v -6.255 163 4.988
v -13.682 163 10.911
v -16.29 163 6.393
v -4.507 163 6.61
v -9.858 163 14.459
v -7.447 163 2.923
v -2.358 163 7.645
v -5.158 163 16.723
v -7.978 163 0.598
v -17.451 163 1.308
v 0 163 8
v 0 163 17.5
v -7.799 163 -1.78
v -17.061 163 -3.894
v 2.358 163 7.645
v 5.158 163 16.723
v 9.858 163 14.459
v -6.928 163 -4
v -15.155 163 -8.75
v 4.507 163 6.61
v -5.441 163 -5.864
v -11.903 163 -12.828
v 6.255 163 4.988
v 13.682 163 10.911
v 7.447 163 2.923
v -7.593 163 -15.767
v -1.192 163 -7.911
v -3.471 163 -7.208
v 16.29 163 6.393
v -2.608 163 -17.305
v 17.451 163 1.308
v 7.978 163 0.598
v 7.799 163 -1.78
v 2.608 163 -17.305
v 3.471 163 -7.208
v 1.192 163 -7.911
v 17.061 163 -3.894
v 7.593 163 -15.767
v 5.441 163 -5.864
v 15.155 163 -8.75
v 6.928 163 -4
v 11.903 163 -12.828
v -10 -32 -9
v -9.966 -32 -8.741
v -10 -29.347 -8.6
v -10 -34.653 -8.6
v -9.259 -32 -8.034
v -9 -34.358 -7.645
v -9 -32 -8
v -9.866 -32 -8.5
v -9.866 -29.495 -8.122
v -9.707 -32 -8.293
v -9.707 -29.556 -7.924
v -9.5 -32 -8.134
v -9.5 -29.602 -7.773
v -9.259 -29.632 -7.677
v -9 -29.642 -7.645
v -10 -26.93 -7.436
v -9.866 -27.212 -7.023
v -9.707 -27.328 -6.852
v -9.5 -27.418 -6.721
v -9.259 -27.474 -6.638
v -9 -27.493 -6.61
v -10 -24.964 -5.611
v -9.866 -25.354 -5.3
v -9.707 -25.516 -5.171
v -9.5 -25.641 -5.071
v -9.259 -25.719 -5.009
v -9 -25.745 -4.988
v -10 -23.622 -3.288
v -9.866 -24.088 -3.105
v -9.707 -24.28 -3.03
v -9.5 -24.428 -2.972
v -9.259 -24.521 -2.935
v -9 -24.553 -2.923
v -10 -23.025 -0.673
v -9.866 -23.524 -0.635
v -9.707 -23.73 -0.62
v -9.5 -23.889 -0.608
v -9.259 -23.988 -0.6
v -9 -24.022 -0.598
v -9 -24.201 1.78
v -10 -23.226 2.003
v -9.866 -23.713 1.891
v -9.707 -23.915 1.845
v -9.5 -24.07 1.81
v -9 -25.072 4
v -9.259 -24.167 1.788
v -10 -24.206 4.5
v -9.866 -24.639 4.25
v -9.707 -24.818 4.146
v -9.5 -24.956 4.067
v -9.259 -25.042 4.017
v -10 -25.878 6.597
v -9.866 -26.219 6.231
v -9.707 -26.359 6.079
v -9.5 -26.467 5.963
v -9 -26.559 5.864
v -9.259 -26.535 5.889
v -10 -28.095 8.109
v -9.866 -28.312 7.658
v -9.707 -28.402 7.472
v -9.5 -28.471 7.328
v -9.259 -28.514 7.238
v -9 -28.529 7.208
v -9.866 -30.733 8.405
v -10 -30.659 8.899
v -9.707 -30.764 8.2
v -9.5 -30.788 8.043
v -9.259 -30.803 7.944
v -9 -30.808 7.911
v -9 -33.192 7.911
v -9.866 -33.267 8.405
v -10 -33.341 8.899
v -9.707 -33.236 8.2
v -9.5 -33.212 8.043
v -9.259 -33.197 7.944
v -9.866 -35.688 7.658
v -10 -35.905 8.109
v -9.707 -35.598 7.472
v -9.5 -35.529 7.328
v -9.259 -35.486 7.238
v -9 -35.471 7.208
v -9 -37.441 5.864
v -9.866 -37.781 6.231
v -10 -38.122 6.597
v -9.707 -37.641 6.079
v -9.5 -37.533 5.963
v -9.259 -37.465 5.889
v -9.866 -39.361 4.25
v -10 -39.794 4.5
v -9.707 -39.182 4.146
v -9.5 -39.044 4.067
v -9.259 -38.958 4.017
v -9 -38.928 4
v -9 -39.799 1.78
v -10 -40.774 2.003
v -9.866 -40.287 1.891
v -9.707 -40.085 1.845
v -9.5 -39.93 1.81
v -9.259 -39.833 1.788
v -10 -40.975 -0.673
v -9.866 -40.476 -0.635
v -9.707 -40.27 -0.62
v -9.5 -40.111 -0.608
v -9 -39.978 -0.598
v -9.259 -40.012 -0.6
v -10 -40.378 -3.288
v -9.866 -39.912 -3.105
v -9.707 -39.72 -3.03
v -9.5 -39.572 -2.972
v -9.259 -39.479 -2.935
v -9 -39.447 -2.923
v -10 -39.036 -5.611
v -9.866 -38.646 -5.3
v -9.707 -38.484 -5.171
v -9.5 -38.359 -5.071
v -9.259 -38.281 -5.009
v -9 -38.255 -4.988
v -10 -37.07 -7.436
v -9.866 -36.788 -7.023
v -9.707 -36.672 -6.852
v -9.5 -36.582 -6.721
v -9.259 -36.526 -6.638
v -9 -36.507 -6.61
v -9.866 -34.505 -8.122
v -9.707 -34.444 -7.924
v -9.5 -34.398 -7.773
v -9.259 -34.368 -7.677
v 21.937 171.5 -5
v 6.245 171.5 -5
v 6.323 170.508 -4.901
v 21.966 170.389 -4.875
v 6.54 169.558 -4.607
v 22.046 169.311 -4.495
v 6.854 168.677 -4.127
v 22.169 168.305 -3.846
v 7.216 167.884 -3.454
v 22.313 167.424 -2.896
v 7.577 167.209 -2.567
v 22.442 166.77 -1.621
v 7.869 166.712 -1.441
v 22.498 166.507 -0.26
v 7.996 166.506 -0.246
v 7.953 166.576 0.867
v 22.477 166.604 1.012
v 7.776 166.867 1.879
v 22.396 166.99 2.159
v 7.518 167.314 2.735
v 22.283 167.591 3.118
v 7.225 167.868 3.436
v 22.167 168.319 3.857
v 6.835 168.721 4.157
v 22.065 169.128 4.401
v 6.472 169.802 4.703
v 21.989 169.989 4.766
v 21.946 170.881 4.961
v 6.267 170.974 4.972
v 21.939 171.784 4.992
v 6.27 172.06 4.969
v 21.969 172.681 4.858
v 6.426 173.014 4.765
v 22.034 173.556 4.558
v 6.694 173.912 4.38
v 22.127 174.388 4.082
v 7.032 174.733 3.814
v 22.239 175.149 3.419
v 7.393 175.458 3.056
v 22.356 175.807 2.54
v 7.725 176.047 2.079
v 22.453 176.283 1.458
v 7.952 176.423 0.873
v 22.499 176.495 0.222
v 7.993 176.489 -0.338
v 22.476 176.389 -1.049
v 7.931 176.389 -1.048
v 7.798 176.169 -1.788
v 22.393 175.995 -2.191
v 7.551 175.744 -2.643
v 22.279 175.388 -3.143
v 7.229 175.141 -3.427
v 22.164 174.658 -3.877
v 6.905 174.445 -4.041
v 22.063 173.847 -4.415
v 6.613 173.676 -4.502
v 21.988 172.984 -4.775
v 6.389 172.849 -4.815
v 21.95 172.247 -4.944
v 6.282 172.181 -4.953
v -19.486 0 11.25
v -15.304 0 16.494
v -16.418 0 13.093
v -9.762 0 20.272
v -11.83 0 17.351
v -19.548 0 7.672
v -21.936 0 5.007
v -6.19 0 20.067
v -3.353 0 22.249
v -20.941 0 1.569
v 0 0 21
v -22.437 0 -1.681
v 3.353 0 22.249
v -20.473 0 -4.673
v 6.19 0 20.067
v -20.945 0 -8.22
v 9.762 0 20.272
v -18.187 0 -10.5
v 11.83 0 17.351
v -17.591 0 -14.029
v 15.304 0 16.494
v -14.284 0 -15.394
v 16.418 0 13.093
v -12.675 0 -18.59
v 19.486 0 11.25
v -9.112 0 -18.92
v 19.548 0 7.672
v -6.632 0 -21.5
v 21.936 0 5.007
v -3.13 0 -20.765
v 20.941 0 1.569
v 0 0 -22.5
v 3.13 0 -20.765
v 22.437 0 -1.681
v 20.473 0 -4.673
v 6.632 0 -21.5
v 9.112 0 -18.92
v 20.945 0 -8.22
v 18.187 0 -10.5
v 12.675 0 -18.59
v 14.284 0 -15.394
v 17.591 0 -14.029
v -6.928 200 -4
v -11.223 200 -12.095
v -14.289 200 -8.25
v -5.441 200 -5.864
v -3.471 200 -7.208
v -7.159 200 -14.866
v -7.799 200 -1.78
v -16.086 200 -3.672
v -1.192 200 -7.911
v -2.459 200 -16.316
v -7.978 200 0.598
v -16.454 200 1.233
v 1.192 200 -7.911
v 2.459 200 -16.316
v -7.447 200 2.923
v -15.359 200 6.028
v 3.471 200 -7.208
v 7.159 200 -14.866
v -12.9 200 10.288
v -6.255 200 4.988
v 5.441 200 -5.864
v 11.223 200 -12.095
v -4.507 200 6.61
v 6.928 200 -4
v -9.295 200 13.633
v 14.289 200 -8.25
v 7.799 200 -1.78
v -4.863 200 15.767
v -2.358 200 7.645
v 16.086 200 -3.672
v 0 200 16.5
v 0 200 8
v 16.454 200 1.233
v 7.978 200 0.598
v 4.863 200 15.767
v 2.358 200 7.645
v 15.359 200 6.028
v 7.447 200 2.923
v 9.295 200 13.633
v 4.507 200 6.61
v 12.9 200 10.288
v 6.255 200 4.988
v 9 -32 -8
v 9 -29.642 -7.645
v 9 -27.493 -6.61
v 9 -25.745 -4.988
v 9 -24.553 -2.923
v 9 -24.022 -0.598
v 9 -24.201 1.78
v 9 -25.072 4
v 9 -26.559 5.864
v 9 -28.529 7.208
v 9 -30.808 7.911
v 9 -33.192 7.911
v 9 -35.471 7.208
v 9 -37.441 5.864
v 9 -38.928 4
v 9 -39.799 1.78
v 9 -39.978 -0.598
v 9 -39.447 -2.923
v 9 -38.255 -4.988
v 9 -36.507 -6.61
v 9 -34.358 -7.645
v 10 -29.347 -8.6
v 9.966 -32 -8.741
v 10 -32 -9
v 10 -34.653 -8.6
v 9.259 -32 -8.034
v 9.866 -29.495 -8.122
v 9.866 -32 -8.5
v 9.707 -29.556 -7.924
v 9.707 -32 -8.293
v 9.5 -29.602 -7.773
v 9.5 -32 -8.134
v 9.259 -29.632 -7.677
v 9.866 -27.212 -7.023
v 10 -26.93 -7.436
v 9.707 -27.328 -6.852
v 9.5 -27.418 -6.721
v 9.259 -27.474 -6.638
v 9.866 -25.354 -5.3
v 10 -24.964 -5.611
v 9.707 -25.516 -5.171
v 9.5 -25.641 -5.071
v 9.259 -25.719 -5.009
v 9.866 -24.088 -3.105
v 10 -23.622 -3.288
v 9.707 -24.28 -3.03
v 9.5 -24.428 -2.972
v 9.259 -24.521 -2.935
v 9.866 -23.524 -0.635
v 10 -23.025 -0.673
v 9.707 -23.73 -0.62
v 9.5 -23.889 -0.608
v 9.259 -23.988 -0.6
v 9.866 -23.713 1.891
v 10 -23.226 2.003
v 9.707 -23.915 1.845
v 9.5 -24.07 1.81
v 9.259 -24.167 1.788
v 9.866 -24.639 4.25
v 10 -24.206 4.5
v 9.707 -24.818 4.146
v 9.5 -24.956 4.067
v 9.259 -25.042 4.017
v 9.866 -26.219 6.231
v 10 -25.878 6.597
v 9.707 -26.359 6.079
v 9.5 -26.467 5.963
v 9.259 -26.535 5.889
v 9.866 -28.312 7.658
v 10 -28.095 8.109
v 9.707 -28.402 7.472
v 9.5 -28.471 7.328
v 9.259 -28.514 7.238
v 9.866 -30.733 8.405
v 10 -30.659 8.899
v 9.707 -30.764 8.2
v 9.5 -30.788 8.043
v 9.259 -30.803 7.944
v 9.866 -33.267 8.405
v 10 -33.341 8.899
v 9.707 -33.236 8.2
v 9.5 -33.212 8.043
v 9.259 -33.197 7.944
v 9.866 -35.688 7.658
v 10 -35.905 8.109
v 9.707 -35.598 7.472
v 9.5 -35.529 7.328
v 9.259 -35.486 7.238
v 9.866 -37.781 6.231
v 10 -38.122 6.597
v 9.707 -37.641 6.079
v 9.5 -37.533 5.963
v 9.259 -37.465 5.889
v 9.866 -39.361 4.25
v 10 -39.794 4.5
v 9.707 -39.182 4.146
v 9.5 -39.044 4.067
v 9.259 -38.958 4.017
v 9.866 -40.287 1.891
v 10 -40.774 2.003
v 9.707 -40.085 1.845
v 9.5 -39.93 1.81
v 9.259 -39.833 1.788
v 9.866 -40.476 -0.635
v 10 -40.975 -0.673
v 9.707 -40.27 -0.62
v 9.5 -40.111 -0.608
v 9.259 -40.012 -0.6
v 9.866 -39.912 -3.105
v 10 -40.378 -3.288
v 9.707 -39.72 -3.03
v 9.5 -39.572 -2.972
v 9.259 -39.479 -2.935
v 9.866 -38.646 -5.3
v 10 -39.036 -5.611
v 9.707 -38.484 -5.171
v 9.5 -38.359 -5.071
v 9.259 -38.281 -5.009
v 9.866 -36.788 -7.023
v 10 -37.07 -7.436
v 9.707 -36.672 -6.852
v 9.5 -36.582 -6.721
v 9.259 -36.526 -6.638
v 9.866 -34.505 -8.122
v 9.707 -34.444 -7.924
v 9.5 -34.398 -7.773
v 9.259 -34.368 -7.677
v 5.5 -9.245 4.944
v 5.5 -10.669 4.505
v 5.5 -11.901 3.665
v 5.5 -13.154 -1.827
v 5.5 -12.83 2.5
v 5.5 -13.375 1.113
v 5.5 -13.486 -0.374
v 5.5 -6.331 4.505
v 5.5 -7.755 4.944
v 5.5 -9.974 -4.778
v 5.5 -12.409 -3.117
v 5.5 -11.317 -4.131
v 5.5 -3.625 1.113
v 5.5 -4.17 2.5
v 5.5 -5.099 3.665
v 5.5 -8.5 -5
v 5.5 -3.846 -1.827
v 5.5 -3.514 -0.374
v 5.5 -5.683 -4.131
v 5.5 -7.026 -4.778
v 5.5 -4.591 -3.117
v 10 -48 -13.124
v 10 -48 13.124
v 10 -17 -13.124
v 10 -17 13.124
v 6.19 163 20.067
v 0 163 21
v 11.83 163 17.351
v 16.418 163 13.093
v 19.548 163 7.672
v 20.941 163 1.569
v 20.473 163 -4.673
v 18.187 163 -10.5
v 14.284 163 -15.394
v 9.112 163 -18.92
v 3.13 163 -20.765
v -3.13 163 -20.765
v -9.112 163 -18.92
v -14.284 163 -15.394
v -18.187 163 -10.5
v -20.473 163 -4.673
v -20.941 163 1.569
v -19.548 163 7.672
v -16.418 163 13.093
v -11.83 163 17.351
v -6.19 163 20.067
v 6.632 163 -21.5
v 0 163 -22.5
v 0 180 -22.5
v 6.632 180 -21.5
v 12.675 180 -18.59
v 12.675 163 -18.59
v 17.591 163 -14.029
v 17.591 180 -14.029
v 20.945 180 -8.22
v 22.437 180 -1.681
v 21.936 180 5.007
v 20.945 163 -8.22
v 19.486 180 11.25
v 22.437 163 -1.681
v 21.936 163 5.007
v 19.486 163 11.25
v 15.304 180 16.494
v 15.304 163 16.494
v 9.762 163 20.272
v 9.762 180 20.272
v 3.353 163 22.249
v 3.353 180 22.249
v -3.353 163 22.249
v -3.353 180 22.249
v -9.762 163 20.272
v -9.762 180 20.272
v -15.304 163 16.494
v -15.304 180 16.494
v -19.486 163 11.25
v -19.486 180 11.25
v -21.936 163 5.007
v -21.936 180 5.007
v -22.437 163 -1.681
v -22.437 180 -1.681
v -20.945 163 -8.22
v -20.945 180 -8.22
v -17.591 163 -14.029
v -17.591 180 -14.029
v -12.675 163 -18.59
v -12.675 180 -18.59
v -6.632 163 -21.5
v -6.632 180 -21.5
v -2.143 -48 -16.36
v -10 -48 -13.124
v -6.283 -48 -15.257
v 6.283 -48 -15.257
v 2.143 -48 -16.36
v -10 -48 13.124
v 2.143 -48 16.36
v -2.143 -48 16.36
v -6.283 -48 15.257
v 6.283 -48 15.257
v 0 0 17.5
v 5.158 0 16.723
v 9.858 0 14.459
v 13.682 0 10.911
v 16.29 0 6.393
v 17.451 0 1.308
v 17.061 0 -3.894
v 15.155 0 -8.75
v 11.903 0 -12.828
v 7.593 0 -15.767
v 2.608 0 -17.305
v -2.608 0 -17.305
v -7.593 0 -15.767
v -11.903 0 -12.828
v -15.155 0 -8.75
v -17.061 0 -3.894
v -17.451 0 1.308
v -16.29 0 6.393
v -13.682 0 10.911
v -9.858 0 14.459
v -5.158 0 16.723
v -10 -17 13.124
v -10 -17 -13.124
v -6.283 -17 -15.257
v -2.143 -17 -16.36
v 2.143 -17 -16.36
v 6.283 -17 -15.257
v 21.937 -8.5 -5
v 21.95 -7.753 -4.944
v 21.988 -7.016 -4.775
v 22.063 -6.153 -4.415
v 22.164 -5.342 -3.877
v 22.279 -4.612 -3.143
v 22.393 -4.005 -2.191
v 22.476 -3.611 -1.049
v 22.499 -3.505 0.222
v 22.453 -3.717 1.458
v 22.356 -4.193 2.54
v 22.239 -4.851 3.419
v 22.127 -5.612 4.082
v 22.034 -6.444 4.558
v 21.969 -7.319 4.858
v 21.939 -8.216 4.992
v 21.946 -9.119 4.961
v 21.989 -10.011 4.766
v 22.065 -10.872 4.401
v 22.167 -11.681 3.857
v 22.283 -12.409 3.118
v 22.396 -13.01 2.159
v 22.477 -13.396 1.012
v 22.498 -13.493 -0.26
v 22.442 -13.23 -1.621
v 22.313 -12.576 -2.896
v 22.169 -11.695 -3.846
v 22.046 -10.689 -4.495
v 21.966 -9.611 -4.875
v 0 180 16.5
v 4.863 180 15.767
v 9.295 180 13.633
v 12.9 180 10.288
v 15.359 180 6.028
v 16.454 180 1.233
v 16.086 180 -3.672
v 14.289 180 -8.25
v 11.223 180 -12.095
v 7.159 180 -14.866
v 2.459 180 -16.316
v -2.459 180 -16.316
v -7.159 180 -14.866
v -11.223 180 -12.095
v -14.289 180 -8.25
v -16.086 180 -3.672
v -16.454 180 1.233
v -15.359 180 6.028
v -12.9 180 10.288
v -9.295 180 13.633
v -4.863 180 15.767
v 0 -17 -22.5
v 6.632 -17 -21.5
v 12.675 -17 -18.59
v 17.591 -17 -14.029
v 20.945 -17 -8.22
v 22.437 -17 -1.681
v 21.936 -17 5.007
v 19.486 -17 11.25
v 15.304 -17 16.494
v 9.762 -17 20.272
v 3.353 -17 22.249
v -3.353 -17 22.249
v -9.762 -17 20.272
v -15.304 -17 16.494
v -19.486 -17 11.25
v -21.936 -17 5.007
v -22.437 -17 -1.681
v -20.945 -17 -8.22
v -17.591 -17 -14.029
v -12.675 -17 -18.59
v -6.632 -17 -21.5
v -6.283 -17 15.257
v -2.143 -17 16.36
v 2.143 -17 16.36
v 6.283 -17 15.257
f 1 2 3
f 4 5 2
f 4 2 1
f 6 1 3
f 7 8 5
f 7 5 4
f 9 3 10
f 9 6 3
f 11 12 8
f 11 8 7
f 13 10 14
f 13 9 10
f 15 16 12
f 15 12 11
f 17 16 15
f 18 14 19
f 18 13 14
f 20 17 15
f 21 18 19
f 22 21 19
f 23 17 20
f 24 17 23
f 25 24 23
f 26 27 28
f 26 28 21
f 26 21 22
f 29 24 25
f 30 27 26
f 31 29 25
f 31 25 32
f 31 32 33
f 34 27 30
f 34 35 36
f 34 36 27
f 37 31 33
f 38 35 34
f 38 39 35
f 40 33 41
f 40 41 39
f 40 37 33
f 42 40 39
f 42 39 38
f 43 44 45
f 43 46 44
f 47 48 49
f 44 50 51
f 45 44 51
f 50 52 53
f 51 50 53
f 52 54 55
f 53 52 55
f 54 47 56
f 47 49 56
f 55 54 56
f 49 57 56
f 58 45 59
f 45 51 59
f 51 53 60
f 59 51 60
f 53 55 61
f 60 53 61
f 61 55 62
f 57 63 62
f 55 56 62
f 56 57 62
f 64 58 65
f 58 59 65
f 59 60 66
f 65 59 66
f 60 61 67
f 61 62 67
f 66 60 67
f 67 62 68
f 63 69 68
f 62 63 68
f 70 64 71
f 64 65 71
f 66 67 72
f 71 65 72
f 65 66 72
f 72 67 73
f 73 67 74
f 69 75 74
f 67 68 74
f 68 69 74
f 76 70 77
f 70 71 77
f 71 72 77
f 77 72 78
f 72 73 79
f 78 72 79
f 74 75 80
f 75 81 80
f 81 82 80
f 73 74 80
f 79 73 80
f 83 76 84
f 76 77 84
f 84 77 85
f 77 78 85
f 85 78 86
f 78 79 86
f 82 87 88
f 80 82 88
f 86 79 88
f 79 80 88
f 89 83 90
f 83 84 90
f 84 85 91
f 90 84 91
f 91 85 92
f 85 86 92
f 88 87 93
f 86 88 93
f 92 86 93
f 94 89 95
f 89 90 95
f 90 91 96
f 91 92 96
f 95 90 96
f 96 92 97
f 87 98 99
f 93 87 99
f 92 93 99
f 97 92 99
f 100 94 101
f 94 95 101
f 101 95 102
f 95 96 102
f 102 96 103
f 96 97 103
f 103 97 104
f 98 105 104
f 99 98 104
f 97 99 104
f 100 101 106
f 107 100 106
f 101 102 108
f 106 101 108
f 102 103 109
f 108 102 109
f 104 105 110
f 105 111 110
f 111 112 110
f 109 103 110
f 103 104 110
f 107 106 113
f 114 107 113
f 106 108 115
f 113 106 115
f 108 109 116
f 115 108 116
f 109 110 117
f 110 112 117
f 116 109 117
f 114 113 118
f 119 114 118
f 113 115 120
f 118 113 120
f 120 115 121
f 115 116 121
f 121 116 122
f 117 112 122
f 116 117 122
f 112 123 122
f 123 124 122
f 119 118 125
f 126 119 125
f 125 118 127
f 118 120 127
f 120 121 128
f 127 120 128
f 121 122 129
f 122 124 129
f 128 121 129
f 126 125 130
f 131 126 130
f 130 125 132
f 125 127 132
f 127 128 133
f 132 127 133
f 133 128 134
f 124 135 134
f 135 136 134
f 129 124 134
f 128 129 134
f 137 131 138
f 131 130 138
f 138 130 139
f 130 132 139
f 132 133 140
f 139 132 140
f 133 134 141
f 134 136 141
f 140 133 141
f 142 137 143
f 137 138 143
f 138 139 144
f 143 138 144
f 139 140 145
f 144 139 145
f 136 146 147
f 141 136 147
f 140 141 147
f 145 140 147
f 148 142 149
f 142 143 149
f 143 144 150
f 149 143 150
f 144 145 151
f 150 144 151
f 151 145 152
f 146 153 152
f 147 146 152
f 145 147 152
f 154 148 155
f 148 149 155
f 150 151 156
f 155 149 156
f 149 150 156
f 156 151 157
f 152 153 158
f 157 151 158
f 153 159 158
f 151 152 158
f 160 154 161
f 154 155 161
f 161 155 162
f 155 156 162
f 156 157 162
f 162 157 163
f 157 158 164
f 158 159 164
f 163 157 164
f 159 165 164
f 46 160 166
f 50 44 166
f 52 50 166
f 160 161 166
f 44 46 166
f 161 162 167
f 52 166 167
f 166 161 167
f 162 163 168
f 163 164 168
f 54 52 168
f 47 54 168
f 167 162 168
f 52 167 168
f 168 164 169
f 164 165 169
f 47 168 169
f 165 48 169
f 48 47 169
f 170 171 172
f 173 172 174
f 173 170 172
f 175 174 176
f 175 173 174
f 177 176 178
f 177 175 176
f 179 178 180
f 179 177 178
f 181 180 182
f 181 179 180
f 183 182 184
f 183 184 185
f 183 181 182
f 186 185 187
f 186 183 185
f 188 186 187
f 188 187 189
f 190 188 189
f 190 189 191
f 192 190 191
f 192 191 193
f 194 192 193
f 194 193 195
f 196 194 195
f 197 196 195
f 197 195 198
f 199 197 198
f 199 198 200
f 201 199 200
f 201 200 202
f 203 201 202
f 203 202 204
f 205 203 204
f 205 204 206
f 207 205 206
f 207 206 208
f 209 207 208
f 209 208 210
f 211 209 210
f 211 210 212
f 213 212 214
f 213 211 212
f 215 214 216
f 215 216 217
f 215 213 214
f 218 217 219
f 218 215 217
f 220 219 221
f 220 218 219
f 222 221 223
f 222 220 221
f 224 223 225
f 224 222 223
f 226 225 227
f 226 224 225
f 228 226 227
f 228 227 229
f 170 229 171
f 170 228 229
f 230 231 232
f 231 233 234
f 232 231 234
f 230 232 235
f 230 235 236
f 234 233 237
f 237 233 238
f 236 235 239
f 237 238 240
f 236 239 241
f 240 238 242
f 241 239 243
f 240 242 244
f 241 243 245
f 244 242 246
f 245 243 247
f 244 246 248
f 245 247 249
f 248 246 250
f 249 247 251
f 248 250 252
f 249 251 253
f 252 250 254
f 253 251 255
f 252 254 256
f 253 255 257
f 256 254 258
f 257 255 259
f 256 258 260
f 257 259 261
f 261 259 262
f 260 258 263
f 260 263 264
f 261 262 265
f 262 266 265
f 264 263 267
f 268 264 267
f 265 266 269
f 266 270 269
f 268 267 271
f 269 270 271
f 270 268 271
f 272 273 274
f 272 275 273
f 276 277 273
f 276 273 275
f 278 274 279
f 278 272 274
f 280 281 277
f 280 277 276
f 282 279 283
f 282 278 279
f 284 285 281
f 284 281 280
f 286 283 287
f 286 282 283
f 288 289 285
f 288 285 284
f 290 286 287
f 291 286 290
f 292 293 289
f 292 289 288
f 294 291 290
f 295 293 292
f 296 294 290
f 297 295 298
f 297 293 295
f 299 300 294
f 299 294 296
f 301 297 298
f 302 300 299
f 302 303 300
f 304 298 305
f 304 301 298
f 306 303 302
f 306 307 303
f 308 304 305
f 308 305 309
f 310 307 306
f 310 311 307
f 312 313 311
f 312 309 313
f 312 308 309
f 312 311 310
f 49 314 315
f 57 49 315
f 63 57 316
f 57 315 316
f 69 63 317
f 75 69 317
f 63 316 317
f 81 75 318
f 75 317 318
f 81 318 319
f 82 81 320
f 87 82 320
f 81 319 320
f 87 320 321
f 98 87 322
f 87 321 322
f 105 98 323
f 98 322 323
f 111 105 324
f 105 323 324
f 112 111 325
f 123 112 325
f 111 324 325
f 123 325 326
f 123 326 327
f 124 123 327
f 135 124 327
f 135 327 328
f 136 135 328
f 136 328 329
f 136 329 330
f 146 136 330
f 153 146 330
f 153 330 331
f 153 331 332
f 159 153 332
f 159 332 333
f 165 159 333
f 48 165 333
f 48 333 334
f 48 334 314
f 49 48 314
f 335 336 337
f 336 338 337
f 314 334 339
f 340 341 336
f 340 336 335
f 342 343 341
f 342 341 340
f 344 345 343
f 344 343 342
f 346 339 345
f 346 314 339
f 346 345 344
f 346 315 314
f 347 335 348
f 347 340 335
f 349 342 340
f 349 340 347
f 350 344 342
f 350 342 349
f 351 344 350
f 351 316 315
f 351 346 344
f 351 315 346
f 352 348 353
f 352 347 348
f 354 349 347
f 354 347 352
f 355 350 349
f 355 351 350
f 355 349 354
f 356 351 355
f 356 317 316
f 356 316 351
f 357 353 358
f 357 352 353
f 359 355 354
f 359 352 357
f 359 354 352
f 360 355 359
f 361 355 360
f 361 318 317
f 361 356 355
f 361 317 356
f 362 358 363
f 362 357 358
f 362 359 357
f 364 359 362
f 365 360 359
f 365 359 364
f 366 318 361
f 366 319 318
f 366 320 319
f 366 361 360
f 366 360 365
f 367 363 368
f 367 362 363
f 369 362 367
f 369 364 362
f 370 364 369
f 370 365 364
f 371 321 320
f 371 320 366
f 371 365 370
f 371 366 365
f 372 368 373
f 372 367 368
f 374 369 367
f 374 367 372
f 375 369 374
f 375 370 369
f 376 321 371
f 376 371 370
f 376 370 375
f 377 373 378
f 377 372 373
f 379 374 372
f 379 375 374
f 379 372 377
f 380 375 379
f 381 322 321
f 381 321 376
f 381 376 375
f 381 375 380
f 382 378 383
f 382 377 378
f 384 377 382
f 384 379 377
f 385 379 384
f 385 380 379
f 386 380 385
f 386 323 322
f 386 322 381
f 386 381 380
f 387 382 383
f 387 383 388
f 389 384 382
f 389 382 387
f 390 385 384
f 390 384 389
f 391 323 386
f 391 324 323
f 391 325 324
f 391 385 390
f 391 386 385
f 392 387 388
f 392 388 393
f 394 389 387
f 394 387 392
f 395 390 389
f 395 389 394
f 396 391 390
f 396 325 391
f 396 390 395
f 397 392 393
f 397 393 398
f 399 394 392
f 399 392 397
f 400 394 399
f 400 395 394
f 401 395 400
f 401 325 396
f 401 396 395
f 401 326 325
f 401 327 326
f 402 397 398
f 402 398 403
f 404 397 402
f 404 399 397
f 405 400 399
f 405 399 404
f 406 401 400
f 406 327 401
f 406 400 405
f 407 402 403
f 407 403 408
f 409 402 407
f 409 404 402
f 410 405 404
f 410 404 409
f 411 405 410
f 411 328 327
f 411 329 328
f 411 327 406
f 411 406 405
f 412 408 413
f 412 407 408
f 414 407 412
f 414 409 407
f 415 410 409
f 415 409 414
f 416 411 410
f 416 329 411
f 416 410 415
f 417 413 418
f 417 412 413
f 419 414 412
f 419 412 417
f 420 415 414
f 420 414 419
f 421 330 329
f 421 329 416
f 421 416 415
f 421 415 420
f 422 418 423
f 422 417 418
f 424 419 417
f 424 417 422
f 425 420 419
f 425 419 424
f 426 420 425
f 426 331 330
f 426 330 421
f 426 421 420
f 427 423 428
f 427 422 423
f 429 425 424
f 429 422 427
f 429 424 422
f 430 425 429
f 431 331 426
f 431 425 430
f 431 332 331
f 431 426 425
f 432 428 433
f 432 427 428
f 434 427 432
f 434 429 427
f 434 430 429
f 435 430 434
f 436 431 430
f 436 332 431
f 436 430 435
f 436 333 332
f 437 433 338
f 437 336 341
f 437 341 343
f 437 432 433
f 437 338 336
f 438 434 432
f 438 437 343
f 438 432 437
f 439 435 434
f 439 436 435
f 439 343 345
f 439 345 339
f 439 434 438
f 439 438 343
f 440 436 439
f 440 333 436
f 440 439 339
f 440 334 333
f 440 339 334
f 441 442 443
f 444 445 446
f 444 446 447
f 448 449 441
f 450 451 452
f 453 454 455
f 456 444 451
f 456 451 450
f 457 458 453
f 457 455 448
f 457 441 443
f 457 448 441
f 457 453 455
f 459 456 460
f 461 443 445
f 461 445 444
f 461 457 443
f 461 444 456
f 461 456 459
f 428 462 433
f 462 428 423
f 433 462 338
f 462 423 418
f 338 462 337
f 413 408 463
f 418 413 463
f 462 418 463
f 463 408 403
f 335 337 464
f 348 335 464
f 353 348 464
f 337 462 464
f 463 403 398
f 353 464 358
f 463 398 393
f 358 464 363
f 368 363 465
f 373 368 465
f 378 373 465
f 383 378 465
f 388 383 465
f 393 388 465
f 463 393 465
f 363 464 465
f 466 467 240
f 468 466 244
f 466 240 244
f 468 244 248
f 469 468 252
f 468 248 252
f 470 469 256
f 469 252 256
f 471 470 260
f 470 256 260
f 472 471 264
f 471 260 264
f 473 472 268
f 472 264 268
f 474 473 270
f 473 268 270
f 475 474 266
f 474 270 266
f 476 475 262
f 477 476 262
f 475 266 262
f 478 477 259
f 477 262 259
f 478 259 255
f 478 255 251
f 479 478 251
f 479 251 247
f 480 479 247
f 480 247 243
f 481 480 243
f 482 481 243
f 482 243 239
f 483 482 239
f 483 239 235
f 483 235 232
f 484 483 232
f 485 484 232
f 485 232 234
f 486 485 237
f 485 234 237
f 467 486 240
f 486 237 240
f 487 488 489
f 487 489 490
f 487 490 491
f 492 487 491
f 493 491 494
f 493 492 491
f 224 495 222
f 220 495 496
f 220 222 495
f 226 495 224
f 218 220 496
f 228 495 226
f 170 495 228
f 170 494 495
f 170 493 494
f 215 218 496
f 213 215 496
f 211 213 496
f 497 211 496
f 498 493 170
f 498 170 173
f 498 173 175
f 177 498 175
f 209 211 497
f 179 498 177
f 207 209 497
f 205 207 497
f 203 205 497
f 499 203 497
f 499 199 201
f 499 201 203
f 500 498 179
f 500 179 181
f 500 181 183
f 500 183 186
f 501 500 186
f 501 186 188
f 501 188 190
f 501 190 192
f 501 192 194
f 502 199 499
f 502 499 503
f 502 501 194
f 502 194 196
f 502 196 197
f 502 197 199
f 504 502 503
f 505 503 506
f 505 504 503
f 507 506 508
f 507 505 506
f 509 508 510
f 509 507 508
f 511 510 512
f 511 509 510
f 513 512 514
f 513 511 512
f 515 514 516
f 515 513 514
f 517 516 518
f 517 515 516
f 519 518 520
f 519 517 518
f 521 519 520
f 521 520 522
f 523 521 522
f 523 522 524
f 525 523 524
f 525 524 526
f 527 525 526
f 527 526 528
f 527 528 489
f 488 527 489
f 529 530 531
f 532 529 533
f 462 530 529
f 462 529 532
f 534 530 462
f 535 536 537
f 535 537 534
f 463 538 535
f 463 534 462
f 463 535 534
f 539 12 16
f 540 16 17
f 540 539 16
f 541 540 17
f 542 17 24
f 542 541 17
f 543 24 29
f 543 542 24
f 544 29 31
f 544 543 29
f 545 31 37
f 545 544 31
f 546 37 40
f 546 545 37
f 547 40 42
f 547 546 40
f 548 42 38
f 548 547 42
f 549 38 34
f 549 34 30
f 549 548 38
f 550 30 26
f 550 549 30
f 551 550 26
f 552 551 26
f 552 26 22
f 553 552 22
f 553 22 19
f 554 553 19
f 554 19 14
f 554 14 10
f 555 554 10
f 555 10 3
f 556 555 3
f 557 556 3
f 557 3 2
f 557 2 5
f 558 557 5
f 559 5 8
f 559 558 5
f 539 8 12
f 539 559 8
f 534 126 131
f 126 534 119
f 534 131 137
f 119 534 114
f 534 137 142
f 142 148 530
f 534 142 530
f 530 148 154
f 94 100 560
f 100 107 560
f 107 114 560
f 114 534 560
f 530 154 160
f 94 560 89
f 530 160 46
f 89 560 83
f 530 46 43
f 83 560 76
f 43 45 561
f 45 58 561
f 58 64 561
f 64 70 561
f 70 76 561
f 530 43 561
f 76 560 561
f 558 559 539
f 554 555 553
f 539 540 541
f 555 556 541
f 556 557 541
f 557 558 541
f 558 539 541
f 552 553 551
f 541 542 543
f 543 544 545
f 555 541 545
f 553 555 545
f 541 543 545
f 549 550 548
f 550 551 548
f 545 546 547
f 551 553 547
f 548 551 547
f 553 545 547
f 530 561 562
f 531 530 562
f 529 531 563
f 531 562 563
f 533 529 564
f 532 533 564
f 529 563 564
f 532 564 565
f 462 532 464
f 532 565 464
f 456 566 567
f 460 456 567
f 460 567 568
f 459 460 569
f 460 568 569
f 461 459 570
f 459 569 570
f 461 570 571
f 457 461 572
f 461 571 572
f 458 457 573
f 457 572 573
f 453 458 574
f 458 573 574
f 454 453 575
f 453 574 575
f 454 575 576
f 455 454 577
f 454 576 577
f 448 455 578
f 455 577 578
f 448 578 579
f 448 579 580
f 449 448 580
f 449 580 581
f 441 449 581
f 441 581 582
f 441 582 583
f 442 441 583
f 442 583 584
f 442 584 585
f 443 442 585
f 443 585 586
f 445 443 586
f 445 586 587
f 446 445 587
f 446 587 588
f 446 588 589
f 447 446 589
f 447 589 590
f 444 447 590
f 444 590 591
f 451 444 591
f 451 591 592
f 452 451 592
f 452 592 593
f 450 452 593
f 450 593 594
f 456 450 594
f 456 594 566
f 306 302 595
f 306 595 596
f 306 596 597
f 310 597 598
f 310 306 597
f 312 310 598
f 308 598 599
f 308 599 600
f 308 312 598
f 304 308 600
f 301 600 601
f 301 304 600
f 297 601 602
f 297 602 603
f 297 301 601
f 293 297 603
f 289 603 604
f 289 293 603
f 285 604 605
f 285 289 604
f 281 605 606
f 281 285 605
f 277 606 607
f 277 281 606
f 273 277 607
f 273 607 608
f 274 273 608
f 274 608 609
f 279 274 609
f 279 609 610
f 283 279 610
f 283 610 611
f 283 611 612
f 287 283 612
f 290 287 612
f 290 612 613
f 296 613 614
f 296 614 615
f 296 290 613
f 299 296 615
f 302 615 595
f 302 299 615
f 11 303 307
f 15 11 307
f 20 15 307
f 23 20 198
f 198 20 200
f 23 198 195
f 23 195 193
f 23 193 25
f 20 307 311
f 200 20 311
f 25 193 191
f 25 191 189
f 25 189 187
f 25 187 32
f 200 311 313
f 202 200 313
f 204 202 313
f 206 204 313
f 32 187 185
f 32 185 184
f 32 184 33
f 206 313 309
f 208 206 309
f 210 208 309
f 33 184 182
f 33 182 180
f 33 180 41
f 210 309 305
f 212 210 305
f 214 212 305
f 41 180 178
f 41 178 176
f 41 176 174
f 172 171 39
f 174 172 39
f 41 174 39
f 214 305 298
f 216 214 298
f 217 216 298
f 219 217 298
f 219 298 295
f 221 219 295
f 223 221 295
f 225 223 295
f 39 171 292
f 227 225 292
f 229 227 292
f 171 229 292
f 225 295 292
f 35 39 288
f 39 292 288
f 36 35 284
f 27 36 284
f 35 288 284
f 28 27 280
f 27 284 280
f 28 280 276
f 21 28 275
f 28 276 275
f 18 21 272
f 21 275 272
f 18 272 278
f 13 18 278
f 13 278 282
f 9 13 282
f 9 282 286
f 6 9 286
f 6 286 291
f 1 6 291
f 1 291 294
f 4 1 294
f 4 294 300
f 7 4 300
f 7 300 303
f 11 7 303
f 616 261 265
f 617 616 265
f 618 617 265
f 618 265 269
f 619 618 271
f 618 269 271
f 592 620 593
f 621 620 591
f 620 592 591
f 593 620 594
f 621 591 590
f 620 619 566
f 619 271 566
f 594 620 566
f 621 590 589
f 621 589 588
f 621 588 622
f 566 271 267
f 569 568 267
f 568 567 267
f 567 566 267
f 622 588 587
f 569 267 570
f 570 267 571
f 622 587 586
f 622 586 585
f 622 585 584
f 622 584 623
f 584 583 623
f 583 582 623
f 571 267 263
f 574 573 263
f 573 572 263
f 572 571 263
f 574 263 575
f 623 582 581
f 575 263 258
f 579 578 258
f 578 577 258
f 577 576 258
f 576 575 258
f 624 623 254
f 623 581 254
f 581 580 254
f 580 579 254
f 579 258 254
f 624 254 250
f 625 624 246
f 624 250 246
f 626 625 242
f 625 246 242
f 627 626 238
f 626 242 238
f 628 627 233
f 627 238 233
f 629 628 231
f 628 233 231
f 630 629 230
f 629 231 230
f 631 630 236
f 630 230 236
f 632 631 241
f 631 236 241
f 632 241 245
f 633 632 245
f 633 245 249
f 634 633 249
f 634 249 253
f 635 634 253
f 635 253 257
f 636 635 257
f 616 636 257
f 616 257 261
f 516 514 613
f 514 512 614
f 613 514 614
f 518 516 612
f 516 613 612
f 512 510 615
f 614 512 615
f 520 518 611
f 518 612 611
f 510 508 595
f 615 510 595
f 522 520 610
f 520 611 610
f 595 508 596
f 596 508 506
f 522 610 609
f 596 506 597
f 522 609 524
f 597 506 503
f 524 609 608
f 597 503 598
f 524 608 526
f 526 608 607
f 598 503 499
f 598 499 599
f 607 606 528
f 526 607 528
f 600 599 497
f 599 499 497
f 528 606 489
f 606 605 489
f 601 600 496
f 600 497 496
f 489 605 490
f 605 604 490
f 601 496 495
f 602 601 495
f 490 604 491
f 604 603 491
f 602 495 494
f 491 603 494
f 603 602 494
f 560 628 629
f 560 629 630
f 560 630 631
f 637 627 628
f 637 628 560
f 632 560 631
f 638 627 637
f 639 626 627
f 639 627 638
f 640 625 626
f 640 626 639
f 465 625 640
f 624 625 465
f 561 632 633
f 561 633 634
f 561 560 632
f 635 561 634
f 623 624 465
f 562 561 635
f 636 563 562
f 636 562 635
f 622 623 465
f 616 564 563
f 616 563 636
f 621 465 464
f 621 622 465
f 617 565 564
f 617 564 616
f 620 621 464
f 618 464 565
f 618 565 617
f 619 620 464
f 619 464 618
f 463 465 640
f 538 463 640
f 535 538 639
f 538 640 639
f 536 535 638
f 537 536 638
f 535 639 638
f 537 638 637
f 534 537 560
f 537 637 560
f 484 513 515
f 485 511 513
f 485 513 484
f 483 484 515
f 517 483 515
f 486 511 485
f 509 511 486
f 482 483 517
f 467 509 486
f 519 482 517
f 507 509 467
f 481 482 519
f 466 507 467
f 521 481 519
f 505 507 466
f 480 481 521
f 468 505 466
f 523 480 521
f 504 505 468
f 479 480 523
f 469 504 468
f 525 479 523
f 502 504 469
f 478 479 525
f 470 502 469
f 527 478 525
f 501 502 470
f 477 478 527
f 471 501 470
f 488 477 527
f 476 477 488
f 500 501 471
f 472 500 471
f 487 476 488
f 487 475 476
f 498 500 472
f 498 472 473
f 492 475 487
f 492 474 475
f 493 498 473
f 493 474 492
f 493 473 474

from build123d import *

# Parameters (mm, degrees)
SKETCH_1_R          = 21
SKETCH_1_R_2        = 17.5
EXTRUDE_1_DEPTH     = 163
SKETCH_2_R          = 22.5
EXTRUDE_2_DEPTH     = 17
SKETCH_4_R          = 5
CUT_EXTRUDE_3_DEPTH = 17
EXTRUDE_4_DEPTH     = 31
SKETCH_6_R          = 8
CUT_EXTRUDE_5_DEPTH = 31
FILLET_1_R          = 1
EXTRUDE_START       = 20
SKETCH_7_R          = 16.5
EXTRUDE_6_DEPTH     = 20
CUT_EXTRUDE_9_REACH = 252.033
SKETCH_8_R          = 8


with BuildPart() as part:
    # 草图1 → 拉伸1 (new body)
    with BuildSketch(Plane(origin=(0, 0, 0), x_dir=(1, 0, 0), z_dir=(0, 1, 0))):
        with Locations(Location((0, 0, 0), (0, 0, 270))):
            Circle(SKETCH_1_R)
        with Locations(Location((0, 0, 0), (0, 0, 270))):
            Circle(SKETCH_1_R_2, mode=Mode.SUBTRACT)
    extrude(amount=EXTRUDE_1_DEPTH)

    # 草图2 → 拉伸2 (add)
    with BuildSketch(Plane.XZ):
        with Locations(Location((0, 0, 0), (0, 0, 270))):
            Circle(SKETCH_2_R)
    extrude_2 = extrude(amount=EXTRUDE_2_DEPTH)

    # 草图4 → 拉伸3 (cut)
    with BuildSketch(Plane(origin=(22.5, 0, 0), x_dir=(0, 0, -1), z_dir=(1, 0, 0))):
        with Locations((0, -8.5)):
            Circle(SKETCH_4_R)
    cut_extrude_3 = extrude(amount=-CUT_EXTRUDE_3_DEPTH, mode=Mode.SUBTRACT)

    # 镜向1: 拉伸2, 拉伸3 across plane
    add(extrude_2.mirror(Plane.ZX.offset(81.5)))
    add(cut_extrude_3.mirror(Plane.ZX.offset(81.5)), mode=Mode.SUBTRACT)

    # 草图5 → 拉伸4 (add)
    with BuildSketch(Plane.XZ.offset(17)):
        with BuildLine():
            Line((10, -13.124404748), (10, 13.124404748))
            ThreePointArc((10, 13.124404748), (0, 16.5), (-10, 13.124404748))
            Line((-10, 13.124404748), (-10, -13.124404748))
            ThreePointArc((-10, -13.124404748), (0, -16.5), (10, -13.124404748))
        make_face()
    extrude(amount=EXTRUDE_4_DEPTH)

    # 草图6 → 拉伸5 (cut)
    with BuildSketch(Plane(origin=(10, 0, 0), x_dir=(0, 0, -1), z_dir=(1, 0, 0))):
        with Locations((0, -32)):
            Circle(SKETCH_6_R)
    extrude(amount=-CUT_EXTRUDE_5_DEPTH, mode=Mode.SUBTRACT)

    # 圆角1
    fillet_1_edges = [part.edges().sort_by_distance(p)[0] for p in [
        (-10, -32, 8),
        (10, -32, 8),
    ]]
    fillet(fillet_1_edges, radius=FILLET_1_R)

    # 草图7 → 拉伸6 (add)
    with BuildSketch(Plane(origin=(0, 180, 0), x_dir=(1, 0, 0), z_dir=(0, 1, 0)).offset(EXTRUDE_START)):
        with Locations(Location((0, 0, 0), (0, 0, 270))):
            Circle(SKETCH_7_R)
    extrude(amount=-EXTRUDE_6_DEPTH)

    # 草图8 → 拉伸9 (cut, up to next)
    with BuildSketch(Plane(origin=(0, 200, 0), x_dir=(1, 0, 0), z_dir=(0, 1, 0)), mode=Mode.PRIVATE) as cut_extrude_9_sk1:
        with Locations(Location((0, 0, 0), (0, 0, 270))):
            Circle(SKETCH_8_R)
    cut_extrude_9_tool1 = extrude(cut_extrude_9_sk1.sketch, amount=-CUT_EXTRUDE_9_REACH, mode=Mode.PRIVATE) & part.part
    add(cut_extrude_9_tool1.solids().sort_by_distance((0, 200, 0))[0], mode=Mode.SUBTRACT)


solid = part.part
